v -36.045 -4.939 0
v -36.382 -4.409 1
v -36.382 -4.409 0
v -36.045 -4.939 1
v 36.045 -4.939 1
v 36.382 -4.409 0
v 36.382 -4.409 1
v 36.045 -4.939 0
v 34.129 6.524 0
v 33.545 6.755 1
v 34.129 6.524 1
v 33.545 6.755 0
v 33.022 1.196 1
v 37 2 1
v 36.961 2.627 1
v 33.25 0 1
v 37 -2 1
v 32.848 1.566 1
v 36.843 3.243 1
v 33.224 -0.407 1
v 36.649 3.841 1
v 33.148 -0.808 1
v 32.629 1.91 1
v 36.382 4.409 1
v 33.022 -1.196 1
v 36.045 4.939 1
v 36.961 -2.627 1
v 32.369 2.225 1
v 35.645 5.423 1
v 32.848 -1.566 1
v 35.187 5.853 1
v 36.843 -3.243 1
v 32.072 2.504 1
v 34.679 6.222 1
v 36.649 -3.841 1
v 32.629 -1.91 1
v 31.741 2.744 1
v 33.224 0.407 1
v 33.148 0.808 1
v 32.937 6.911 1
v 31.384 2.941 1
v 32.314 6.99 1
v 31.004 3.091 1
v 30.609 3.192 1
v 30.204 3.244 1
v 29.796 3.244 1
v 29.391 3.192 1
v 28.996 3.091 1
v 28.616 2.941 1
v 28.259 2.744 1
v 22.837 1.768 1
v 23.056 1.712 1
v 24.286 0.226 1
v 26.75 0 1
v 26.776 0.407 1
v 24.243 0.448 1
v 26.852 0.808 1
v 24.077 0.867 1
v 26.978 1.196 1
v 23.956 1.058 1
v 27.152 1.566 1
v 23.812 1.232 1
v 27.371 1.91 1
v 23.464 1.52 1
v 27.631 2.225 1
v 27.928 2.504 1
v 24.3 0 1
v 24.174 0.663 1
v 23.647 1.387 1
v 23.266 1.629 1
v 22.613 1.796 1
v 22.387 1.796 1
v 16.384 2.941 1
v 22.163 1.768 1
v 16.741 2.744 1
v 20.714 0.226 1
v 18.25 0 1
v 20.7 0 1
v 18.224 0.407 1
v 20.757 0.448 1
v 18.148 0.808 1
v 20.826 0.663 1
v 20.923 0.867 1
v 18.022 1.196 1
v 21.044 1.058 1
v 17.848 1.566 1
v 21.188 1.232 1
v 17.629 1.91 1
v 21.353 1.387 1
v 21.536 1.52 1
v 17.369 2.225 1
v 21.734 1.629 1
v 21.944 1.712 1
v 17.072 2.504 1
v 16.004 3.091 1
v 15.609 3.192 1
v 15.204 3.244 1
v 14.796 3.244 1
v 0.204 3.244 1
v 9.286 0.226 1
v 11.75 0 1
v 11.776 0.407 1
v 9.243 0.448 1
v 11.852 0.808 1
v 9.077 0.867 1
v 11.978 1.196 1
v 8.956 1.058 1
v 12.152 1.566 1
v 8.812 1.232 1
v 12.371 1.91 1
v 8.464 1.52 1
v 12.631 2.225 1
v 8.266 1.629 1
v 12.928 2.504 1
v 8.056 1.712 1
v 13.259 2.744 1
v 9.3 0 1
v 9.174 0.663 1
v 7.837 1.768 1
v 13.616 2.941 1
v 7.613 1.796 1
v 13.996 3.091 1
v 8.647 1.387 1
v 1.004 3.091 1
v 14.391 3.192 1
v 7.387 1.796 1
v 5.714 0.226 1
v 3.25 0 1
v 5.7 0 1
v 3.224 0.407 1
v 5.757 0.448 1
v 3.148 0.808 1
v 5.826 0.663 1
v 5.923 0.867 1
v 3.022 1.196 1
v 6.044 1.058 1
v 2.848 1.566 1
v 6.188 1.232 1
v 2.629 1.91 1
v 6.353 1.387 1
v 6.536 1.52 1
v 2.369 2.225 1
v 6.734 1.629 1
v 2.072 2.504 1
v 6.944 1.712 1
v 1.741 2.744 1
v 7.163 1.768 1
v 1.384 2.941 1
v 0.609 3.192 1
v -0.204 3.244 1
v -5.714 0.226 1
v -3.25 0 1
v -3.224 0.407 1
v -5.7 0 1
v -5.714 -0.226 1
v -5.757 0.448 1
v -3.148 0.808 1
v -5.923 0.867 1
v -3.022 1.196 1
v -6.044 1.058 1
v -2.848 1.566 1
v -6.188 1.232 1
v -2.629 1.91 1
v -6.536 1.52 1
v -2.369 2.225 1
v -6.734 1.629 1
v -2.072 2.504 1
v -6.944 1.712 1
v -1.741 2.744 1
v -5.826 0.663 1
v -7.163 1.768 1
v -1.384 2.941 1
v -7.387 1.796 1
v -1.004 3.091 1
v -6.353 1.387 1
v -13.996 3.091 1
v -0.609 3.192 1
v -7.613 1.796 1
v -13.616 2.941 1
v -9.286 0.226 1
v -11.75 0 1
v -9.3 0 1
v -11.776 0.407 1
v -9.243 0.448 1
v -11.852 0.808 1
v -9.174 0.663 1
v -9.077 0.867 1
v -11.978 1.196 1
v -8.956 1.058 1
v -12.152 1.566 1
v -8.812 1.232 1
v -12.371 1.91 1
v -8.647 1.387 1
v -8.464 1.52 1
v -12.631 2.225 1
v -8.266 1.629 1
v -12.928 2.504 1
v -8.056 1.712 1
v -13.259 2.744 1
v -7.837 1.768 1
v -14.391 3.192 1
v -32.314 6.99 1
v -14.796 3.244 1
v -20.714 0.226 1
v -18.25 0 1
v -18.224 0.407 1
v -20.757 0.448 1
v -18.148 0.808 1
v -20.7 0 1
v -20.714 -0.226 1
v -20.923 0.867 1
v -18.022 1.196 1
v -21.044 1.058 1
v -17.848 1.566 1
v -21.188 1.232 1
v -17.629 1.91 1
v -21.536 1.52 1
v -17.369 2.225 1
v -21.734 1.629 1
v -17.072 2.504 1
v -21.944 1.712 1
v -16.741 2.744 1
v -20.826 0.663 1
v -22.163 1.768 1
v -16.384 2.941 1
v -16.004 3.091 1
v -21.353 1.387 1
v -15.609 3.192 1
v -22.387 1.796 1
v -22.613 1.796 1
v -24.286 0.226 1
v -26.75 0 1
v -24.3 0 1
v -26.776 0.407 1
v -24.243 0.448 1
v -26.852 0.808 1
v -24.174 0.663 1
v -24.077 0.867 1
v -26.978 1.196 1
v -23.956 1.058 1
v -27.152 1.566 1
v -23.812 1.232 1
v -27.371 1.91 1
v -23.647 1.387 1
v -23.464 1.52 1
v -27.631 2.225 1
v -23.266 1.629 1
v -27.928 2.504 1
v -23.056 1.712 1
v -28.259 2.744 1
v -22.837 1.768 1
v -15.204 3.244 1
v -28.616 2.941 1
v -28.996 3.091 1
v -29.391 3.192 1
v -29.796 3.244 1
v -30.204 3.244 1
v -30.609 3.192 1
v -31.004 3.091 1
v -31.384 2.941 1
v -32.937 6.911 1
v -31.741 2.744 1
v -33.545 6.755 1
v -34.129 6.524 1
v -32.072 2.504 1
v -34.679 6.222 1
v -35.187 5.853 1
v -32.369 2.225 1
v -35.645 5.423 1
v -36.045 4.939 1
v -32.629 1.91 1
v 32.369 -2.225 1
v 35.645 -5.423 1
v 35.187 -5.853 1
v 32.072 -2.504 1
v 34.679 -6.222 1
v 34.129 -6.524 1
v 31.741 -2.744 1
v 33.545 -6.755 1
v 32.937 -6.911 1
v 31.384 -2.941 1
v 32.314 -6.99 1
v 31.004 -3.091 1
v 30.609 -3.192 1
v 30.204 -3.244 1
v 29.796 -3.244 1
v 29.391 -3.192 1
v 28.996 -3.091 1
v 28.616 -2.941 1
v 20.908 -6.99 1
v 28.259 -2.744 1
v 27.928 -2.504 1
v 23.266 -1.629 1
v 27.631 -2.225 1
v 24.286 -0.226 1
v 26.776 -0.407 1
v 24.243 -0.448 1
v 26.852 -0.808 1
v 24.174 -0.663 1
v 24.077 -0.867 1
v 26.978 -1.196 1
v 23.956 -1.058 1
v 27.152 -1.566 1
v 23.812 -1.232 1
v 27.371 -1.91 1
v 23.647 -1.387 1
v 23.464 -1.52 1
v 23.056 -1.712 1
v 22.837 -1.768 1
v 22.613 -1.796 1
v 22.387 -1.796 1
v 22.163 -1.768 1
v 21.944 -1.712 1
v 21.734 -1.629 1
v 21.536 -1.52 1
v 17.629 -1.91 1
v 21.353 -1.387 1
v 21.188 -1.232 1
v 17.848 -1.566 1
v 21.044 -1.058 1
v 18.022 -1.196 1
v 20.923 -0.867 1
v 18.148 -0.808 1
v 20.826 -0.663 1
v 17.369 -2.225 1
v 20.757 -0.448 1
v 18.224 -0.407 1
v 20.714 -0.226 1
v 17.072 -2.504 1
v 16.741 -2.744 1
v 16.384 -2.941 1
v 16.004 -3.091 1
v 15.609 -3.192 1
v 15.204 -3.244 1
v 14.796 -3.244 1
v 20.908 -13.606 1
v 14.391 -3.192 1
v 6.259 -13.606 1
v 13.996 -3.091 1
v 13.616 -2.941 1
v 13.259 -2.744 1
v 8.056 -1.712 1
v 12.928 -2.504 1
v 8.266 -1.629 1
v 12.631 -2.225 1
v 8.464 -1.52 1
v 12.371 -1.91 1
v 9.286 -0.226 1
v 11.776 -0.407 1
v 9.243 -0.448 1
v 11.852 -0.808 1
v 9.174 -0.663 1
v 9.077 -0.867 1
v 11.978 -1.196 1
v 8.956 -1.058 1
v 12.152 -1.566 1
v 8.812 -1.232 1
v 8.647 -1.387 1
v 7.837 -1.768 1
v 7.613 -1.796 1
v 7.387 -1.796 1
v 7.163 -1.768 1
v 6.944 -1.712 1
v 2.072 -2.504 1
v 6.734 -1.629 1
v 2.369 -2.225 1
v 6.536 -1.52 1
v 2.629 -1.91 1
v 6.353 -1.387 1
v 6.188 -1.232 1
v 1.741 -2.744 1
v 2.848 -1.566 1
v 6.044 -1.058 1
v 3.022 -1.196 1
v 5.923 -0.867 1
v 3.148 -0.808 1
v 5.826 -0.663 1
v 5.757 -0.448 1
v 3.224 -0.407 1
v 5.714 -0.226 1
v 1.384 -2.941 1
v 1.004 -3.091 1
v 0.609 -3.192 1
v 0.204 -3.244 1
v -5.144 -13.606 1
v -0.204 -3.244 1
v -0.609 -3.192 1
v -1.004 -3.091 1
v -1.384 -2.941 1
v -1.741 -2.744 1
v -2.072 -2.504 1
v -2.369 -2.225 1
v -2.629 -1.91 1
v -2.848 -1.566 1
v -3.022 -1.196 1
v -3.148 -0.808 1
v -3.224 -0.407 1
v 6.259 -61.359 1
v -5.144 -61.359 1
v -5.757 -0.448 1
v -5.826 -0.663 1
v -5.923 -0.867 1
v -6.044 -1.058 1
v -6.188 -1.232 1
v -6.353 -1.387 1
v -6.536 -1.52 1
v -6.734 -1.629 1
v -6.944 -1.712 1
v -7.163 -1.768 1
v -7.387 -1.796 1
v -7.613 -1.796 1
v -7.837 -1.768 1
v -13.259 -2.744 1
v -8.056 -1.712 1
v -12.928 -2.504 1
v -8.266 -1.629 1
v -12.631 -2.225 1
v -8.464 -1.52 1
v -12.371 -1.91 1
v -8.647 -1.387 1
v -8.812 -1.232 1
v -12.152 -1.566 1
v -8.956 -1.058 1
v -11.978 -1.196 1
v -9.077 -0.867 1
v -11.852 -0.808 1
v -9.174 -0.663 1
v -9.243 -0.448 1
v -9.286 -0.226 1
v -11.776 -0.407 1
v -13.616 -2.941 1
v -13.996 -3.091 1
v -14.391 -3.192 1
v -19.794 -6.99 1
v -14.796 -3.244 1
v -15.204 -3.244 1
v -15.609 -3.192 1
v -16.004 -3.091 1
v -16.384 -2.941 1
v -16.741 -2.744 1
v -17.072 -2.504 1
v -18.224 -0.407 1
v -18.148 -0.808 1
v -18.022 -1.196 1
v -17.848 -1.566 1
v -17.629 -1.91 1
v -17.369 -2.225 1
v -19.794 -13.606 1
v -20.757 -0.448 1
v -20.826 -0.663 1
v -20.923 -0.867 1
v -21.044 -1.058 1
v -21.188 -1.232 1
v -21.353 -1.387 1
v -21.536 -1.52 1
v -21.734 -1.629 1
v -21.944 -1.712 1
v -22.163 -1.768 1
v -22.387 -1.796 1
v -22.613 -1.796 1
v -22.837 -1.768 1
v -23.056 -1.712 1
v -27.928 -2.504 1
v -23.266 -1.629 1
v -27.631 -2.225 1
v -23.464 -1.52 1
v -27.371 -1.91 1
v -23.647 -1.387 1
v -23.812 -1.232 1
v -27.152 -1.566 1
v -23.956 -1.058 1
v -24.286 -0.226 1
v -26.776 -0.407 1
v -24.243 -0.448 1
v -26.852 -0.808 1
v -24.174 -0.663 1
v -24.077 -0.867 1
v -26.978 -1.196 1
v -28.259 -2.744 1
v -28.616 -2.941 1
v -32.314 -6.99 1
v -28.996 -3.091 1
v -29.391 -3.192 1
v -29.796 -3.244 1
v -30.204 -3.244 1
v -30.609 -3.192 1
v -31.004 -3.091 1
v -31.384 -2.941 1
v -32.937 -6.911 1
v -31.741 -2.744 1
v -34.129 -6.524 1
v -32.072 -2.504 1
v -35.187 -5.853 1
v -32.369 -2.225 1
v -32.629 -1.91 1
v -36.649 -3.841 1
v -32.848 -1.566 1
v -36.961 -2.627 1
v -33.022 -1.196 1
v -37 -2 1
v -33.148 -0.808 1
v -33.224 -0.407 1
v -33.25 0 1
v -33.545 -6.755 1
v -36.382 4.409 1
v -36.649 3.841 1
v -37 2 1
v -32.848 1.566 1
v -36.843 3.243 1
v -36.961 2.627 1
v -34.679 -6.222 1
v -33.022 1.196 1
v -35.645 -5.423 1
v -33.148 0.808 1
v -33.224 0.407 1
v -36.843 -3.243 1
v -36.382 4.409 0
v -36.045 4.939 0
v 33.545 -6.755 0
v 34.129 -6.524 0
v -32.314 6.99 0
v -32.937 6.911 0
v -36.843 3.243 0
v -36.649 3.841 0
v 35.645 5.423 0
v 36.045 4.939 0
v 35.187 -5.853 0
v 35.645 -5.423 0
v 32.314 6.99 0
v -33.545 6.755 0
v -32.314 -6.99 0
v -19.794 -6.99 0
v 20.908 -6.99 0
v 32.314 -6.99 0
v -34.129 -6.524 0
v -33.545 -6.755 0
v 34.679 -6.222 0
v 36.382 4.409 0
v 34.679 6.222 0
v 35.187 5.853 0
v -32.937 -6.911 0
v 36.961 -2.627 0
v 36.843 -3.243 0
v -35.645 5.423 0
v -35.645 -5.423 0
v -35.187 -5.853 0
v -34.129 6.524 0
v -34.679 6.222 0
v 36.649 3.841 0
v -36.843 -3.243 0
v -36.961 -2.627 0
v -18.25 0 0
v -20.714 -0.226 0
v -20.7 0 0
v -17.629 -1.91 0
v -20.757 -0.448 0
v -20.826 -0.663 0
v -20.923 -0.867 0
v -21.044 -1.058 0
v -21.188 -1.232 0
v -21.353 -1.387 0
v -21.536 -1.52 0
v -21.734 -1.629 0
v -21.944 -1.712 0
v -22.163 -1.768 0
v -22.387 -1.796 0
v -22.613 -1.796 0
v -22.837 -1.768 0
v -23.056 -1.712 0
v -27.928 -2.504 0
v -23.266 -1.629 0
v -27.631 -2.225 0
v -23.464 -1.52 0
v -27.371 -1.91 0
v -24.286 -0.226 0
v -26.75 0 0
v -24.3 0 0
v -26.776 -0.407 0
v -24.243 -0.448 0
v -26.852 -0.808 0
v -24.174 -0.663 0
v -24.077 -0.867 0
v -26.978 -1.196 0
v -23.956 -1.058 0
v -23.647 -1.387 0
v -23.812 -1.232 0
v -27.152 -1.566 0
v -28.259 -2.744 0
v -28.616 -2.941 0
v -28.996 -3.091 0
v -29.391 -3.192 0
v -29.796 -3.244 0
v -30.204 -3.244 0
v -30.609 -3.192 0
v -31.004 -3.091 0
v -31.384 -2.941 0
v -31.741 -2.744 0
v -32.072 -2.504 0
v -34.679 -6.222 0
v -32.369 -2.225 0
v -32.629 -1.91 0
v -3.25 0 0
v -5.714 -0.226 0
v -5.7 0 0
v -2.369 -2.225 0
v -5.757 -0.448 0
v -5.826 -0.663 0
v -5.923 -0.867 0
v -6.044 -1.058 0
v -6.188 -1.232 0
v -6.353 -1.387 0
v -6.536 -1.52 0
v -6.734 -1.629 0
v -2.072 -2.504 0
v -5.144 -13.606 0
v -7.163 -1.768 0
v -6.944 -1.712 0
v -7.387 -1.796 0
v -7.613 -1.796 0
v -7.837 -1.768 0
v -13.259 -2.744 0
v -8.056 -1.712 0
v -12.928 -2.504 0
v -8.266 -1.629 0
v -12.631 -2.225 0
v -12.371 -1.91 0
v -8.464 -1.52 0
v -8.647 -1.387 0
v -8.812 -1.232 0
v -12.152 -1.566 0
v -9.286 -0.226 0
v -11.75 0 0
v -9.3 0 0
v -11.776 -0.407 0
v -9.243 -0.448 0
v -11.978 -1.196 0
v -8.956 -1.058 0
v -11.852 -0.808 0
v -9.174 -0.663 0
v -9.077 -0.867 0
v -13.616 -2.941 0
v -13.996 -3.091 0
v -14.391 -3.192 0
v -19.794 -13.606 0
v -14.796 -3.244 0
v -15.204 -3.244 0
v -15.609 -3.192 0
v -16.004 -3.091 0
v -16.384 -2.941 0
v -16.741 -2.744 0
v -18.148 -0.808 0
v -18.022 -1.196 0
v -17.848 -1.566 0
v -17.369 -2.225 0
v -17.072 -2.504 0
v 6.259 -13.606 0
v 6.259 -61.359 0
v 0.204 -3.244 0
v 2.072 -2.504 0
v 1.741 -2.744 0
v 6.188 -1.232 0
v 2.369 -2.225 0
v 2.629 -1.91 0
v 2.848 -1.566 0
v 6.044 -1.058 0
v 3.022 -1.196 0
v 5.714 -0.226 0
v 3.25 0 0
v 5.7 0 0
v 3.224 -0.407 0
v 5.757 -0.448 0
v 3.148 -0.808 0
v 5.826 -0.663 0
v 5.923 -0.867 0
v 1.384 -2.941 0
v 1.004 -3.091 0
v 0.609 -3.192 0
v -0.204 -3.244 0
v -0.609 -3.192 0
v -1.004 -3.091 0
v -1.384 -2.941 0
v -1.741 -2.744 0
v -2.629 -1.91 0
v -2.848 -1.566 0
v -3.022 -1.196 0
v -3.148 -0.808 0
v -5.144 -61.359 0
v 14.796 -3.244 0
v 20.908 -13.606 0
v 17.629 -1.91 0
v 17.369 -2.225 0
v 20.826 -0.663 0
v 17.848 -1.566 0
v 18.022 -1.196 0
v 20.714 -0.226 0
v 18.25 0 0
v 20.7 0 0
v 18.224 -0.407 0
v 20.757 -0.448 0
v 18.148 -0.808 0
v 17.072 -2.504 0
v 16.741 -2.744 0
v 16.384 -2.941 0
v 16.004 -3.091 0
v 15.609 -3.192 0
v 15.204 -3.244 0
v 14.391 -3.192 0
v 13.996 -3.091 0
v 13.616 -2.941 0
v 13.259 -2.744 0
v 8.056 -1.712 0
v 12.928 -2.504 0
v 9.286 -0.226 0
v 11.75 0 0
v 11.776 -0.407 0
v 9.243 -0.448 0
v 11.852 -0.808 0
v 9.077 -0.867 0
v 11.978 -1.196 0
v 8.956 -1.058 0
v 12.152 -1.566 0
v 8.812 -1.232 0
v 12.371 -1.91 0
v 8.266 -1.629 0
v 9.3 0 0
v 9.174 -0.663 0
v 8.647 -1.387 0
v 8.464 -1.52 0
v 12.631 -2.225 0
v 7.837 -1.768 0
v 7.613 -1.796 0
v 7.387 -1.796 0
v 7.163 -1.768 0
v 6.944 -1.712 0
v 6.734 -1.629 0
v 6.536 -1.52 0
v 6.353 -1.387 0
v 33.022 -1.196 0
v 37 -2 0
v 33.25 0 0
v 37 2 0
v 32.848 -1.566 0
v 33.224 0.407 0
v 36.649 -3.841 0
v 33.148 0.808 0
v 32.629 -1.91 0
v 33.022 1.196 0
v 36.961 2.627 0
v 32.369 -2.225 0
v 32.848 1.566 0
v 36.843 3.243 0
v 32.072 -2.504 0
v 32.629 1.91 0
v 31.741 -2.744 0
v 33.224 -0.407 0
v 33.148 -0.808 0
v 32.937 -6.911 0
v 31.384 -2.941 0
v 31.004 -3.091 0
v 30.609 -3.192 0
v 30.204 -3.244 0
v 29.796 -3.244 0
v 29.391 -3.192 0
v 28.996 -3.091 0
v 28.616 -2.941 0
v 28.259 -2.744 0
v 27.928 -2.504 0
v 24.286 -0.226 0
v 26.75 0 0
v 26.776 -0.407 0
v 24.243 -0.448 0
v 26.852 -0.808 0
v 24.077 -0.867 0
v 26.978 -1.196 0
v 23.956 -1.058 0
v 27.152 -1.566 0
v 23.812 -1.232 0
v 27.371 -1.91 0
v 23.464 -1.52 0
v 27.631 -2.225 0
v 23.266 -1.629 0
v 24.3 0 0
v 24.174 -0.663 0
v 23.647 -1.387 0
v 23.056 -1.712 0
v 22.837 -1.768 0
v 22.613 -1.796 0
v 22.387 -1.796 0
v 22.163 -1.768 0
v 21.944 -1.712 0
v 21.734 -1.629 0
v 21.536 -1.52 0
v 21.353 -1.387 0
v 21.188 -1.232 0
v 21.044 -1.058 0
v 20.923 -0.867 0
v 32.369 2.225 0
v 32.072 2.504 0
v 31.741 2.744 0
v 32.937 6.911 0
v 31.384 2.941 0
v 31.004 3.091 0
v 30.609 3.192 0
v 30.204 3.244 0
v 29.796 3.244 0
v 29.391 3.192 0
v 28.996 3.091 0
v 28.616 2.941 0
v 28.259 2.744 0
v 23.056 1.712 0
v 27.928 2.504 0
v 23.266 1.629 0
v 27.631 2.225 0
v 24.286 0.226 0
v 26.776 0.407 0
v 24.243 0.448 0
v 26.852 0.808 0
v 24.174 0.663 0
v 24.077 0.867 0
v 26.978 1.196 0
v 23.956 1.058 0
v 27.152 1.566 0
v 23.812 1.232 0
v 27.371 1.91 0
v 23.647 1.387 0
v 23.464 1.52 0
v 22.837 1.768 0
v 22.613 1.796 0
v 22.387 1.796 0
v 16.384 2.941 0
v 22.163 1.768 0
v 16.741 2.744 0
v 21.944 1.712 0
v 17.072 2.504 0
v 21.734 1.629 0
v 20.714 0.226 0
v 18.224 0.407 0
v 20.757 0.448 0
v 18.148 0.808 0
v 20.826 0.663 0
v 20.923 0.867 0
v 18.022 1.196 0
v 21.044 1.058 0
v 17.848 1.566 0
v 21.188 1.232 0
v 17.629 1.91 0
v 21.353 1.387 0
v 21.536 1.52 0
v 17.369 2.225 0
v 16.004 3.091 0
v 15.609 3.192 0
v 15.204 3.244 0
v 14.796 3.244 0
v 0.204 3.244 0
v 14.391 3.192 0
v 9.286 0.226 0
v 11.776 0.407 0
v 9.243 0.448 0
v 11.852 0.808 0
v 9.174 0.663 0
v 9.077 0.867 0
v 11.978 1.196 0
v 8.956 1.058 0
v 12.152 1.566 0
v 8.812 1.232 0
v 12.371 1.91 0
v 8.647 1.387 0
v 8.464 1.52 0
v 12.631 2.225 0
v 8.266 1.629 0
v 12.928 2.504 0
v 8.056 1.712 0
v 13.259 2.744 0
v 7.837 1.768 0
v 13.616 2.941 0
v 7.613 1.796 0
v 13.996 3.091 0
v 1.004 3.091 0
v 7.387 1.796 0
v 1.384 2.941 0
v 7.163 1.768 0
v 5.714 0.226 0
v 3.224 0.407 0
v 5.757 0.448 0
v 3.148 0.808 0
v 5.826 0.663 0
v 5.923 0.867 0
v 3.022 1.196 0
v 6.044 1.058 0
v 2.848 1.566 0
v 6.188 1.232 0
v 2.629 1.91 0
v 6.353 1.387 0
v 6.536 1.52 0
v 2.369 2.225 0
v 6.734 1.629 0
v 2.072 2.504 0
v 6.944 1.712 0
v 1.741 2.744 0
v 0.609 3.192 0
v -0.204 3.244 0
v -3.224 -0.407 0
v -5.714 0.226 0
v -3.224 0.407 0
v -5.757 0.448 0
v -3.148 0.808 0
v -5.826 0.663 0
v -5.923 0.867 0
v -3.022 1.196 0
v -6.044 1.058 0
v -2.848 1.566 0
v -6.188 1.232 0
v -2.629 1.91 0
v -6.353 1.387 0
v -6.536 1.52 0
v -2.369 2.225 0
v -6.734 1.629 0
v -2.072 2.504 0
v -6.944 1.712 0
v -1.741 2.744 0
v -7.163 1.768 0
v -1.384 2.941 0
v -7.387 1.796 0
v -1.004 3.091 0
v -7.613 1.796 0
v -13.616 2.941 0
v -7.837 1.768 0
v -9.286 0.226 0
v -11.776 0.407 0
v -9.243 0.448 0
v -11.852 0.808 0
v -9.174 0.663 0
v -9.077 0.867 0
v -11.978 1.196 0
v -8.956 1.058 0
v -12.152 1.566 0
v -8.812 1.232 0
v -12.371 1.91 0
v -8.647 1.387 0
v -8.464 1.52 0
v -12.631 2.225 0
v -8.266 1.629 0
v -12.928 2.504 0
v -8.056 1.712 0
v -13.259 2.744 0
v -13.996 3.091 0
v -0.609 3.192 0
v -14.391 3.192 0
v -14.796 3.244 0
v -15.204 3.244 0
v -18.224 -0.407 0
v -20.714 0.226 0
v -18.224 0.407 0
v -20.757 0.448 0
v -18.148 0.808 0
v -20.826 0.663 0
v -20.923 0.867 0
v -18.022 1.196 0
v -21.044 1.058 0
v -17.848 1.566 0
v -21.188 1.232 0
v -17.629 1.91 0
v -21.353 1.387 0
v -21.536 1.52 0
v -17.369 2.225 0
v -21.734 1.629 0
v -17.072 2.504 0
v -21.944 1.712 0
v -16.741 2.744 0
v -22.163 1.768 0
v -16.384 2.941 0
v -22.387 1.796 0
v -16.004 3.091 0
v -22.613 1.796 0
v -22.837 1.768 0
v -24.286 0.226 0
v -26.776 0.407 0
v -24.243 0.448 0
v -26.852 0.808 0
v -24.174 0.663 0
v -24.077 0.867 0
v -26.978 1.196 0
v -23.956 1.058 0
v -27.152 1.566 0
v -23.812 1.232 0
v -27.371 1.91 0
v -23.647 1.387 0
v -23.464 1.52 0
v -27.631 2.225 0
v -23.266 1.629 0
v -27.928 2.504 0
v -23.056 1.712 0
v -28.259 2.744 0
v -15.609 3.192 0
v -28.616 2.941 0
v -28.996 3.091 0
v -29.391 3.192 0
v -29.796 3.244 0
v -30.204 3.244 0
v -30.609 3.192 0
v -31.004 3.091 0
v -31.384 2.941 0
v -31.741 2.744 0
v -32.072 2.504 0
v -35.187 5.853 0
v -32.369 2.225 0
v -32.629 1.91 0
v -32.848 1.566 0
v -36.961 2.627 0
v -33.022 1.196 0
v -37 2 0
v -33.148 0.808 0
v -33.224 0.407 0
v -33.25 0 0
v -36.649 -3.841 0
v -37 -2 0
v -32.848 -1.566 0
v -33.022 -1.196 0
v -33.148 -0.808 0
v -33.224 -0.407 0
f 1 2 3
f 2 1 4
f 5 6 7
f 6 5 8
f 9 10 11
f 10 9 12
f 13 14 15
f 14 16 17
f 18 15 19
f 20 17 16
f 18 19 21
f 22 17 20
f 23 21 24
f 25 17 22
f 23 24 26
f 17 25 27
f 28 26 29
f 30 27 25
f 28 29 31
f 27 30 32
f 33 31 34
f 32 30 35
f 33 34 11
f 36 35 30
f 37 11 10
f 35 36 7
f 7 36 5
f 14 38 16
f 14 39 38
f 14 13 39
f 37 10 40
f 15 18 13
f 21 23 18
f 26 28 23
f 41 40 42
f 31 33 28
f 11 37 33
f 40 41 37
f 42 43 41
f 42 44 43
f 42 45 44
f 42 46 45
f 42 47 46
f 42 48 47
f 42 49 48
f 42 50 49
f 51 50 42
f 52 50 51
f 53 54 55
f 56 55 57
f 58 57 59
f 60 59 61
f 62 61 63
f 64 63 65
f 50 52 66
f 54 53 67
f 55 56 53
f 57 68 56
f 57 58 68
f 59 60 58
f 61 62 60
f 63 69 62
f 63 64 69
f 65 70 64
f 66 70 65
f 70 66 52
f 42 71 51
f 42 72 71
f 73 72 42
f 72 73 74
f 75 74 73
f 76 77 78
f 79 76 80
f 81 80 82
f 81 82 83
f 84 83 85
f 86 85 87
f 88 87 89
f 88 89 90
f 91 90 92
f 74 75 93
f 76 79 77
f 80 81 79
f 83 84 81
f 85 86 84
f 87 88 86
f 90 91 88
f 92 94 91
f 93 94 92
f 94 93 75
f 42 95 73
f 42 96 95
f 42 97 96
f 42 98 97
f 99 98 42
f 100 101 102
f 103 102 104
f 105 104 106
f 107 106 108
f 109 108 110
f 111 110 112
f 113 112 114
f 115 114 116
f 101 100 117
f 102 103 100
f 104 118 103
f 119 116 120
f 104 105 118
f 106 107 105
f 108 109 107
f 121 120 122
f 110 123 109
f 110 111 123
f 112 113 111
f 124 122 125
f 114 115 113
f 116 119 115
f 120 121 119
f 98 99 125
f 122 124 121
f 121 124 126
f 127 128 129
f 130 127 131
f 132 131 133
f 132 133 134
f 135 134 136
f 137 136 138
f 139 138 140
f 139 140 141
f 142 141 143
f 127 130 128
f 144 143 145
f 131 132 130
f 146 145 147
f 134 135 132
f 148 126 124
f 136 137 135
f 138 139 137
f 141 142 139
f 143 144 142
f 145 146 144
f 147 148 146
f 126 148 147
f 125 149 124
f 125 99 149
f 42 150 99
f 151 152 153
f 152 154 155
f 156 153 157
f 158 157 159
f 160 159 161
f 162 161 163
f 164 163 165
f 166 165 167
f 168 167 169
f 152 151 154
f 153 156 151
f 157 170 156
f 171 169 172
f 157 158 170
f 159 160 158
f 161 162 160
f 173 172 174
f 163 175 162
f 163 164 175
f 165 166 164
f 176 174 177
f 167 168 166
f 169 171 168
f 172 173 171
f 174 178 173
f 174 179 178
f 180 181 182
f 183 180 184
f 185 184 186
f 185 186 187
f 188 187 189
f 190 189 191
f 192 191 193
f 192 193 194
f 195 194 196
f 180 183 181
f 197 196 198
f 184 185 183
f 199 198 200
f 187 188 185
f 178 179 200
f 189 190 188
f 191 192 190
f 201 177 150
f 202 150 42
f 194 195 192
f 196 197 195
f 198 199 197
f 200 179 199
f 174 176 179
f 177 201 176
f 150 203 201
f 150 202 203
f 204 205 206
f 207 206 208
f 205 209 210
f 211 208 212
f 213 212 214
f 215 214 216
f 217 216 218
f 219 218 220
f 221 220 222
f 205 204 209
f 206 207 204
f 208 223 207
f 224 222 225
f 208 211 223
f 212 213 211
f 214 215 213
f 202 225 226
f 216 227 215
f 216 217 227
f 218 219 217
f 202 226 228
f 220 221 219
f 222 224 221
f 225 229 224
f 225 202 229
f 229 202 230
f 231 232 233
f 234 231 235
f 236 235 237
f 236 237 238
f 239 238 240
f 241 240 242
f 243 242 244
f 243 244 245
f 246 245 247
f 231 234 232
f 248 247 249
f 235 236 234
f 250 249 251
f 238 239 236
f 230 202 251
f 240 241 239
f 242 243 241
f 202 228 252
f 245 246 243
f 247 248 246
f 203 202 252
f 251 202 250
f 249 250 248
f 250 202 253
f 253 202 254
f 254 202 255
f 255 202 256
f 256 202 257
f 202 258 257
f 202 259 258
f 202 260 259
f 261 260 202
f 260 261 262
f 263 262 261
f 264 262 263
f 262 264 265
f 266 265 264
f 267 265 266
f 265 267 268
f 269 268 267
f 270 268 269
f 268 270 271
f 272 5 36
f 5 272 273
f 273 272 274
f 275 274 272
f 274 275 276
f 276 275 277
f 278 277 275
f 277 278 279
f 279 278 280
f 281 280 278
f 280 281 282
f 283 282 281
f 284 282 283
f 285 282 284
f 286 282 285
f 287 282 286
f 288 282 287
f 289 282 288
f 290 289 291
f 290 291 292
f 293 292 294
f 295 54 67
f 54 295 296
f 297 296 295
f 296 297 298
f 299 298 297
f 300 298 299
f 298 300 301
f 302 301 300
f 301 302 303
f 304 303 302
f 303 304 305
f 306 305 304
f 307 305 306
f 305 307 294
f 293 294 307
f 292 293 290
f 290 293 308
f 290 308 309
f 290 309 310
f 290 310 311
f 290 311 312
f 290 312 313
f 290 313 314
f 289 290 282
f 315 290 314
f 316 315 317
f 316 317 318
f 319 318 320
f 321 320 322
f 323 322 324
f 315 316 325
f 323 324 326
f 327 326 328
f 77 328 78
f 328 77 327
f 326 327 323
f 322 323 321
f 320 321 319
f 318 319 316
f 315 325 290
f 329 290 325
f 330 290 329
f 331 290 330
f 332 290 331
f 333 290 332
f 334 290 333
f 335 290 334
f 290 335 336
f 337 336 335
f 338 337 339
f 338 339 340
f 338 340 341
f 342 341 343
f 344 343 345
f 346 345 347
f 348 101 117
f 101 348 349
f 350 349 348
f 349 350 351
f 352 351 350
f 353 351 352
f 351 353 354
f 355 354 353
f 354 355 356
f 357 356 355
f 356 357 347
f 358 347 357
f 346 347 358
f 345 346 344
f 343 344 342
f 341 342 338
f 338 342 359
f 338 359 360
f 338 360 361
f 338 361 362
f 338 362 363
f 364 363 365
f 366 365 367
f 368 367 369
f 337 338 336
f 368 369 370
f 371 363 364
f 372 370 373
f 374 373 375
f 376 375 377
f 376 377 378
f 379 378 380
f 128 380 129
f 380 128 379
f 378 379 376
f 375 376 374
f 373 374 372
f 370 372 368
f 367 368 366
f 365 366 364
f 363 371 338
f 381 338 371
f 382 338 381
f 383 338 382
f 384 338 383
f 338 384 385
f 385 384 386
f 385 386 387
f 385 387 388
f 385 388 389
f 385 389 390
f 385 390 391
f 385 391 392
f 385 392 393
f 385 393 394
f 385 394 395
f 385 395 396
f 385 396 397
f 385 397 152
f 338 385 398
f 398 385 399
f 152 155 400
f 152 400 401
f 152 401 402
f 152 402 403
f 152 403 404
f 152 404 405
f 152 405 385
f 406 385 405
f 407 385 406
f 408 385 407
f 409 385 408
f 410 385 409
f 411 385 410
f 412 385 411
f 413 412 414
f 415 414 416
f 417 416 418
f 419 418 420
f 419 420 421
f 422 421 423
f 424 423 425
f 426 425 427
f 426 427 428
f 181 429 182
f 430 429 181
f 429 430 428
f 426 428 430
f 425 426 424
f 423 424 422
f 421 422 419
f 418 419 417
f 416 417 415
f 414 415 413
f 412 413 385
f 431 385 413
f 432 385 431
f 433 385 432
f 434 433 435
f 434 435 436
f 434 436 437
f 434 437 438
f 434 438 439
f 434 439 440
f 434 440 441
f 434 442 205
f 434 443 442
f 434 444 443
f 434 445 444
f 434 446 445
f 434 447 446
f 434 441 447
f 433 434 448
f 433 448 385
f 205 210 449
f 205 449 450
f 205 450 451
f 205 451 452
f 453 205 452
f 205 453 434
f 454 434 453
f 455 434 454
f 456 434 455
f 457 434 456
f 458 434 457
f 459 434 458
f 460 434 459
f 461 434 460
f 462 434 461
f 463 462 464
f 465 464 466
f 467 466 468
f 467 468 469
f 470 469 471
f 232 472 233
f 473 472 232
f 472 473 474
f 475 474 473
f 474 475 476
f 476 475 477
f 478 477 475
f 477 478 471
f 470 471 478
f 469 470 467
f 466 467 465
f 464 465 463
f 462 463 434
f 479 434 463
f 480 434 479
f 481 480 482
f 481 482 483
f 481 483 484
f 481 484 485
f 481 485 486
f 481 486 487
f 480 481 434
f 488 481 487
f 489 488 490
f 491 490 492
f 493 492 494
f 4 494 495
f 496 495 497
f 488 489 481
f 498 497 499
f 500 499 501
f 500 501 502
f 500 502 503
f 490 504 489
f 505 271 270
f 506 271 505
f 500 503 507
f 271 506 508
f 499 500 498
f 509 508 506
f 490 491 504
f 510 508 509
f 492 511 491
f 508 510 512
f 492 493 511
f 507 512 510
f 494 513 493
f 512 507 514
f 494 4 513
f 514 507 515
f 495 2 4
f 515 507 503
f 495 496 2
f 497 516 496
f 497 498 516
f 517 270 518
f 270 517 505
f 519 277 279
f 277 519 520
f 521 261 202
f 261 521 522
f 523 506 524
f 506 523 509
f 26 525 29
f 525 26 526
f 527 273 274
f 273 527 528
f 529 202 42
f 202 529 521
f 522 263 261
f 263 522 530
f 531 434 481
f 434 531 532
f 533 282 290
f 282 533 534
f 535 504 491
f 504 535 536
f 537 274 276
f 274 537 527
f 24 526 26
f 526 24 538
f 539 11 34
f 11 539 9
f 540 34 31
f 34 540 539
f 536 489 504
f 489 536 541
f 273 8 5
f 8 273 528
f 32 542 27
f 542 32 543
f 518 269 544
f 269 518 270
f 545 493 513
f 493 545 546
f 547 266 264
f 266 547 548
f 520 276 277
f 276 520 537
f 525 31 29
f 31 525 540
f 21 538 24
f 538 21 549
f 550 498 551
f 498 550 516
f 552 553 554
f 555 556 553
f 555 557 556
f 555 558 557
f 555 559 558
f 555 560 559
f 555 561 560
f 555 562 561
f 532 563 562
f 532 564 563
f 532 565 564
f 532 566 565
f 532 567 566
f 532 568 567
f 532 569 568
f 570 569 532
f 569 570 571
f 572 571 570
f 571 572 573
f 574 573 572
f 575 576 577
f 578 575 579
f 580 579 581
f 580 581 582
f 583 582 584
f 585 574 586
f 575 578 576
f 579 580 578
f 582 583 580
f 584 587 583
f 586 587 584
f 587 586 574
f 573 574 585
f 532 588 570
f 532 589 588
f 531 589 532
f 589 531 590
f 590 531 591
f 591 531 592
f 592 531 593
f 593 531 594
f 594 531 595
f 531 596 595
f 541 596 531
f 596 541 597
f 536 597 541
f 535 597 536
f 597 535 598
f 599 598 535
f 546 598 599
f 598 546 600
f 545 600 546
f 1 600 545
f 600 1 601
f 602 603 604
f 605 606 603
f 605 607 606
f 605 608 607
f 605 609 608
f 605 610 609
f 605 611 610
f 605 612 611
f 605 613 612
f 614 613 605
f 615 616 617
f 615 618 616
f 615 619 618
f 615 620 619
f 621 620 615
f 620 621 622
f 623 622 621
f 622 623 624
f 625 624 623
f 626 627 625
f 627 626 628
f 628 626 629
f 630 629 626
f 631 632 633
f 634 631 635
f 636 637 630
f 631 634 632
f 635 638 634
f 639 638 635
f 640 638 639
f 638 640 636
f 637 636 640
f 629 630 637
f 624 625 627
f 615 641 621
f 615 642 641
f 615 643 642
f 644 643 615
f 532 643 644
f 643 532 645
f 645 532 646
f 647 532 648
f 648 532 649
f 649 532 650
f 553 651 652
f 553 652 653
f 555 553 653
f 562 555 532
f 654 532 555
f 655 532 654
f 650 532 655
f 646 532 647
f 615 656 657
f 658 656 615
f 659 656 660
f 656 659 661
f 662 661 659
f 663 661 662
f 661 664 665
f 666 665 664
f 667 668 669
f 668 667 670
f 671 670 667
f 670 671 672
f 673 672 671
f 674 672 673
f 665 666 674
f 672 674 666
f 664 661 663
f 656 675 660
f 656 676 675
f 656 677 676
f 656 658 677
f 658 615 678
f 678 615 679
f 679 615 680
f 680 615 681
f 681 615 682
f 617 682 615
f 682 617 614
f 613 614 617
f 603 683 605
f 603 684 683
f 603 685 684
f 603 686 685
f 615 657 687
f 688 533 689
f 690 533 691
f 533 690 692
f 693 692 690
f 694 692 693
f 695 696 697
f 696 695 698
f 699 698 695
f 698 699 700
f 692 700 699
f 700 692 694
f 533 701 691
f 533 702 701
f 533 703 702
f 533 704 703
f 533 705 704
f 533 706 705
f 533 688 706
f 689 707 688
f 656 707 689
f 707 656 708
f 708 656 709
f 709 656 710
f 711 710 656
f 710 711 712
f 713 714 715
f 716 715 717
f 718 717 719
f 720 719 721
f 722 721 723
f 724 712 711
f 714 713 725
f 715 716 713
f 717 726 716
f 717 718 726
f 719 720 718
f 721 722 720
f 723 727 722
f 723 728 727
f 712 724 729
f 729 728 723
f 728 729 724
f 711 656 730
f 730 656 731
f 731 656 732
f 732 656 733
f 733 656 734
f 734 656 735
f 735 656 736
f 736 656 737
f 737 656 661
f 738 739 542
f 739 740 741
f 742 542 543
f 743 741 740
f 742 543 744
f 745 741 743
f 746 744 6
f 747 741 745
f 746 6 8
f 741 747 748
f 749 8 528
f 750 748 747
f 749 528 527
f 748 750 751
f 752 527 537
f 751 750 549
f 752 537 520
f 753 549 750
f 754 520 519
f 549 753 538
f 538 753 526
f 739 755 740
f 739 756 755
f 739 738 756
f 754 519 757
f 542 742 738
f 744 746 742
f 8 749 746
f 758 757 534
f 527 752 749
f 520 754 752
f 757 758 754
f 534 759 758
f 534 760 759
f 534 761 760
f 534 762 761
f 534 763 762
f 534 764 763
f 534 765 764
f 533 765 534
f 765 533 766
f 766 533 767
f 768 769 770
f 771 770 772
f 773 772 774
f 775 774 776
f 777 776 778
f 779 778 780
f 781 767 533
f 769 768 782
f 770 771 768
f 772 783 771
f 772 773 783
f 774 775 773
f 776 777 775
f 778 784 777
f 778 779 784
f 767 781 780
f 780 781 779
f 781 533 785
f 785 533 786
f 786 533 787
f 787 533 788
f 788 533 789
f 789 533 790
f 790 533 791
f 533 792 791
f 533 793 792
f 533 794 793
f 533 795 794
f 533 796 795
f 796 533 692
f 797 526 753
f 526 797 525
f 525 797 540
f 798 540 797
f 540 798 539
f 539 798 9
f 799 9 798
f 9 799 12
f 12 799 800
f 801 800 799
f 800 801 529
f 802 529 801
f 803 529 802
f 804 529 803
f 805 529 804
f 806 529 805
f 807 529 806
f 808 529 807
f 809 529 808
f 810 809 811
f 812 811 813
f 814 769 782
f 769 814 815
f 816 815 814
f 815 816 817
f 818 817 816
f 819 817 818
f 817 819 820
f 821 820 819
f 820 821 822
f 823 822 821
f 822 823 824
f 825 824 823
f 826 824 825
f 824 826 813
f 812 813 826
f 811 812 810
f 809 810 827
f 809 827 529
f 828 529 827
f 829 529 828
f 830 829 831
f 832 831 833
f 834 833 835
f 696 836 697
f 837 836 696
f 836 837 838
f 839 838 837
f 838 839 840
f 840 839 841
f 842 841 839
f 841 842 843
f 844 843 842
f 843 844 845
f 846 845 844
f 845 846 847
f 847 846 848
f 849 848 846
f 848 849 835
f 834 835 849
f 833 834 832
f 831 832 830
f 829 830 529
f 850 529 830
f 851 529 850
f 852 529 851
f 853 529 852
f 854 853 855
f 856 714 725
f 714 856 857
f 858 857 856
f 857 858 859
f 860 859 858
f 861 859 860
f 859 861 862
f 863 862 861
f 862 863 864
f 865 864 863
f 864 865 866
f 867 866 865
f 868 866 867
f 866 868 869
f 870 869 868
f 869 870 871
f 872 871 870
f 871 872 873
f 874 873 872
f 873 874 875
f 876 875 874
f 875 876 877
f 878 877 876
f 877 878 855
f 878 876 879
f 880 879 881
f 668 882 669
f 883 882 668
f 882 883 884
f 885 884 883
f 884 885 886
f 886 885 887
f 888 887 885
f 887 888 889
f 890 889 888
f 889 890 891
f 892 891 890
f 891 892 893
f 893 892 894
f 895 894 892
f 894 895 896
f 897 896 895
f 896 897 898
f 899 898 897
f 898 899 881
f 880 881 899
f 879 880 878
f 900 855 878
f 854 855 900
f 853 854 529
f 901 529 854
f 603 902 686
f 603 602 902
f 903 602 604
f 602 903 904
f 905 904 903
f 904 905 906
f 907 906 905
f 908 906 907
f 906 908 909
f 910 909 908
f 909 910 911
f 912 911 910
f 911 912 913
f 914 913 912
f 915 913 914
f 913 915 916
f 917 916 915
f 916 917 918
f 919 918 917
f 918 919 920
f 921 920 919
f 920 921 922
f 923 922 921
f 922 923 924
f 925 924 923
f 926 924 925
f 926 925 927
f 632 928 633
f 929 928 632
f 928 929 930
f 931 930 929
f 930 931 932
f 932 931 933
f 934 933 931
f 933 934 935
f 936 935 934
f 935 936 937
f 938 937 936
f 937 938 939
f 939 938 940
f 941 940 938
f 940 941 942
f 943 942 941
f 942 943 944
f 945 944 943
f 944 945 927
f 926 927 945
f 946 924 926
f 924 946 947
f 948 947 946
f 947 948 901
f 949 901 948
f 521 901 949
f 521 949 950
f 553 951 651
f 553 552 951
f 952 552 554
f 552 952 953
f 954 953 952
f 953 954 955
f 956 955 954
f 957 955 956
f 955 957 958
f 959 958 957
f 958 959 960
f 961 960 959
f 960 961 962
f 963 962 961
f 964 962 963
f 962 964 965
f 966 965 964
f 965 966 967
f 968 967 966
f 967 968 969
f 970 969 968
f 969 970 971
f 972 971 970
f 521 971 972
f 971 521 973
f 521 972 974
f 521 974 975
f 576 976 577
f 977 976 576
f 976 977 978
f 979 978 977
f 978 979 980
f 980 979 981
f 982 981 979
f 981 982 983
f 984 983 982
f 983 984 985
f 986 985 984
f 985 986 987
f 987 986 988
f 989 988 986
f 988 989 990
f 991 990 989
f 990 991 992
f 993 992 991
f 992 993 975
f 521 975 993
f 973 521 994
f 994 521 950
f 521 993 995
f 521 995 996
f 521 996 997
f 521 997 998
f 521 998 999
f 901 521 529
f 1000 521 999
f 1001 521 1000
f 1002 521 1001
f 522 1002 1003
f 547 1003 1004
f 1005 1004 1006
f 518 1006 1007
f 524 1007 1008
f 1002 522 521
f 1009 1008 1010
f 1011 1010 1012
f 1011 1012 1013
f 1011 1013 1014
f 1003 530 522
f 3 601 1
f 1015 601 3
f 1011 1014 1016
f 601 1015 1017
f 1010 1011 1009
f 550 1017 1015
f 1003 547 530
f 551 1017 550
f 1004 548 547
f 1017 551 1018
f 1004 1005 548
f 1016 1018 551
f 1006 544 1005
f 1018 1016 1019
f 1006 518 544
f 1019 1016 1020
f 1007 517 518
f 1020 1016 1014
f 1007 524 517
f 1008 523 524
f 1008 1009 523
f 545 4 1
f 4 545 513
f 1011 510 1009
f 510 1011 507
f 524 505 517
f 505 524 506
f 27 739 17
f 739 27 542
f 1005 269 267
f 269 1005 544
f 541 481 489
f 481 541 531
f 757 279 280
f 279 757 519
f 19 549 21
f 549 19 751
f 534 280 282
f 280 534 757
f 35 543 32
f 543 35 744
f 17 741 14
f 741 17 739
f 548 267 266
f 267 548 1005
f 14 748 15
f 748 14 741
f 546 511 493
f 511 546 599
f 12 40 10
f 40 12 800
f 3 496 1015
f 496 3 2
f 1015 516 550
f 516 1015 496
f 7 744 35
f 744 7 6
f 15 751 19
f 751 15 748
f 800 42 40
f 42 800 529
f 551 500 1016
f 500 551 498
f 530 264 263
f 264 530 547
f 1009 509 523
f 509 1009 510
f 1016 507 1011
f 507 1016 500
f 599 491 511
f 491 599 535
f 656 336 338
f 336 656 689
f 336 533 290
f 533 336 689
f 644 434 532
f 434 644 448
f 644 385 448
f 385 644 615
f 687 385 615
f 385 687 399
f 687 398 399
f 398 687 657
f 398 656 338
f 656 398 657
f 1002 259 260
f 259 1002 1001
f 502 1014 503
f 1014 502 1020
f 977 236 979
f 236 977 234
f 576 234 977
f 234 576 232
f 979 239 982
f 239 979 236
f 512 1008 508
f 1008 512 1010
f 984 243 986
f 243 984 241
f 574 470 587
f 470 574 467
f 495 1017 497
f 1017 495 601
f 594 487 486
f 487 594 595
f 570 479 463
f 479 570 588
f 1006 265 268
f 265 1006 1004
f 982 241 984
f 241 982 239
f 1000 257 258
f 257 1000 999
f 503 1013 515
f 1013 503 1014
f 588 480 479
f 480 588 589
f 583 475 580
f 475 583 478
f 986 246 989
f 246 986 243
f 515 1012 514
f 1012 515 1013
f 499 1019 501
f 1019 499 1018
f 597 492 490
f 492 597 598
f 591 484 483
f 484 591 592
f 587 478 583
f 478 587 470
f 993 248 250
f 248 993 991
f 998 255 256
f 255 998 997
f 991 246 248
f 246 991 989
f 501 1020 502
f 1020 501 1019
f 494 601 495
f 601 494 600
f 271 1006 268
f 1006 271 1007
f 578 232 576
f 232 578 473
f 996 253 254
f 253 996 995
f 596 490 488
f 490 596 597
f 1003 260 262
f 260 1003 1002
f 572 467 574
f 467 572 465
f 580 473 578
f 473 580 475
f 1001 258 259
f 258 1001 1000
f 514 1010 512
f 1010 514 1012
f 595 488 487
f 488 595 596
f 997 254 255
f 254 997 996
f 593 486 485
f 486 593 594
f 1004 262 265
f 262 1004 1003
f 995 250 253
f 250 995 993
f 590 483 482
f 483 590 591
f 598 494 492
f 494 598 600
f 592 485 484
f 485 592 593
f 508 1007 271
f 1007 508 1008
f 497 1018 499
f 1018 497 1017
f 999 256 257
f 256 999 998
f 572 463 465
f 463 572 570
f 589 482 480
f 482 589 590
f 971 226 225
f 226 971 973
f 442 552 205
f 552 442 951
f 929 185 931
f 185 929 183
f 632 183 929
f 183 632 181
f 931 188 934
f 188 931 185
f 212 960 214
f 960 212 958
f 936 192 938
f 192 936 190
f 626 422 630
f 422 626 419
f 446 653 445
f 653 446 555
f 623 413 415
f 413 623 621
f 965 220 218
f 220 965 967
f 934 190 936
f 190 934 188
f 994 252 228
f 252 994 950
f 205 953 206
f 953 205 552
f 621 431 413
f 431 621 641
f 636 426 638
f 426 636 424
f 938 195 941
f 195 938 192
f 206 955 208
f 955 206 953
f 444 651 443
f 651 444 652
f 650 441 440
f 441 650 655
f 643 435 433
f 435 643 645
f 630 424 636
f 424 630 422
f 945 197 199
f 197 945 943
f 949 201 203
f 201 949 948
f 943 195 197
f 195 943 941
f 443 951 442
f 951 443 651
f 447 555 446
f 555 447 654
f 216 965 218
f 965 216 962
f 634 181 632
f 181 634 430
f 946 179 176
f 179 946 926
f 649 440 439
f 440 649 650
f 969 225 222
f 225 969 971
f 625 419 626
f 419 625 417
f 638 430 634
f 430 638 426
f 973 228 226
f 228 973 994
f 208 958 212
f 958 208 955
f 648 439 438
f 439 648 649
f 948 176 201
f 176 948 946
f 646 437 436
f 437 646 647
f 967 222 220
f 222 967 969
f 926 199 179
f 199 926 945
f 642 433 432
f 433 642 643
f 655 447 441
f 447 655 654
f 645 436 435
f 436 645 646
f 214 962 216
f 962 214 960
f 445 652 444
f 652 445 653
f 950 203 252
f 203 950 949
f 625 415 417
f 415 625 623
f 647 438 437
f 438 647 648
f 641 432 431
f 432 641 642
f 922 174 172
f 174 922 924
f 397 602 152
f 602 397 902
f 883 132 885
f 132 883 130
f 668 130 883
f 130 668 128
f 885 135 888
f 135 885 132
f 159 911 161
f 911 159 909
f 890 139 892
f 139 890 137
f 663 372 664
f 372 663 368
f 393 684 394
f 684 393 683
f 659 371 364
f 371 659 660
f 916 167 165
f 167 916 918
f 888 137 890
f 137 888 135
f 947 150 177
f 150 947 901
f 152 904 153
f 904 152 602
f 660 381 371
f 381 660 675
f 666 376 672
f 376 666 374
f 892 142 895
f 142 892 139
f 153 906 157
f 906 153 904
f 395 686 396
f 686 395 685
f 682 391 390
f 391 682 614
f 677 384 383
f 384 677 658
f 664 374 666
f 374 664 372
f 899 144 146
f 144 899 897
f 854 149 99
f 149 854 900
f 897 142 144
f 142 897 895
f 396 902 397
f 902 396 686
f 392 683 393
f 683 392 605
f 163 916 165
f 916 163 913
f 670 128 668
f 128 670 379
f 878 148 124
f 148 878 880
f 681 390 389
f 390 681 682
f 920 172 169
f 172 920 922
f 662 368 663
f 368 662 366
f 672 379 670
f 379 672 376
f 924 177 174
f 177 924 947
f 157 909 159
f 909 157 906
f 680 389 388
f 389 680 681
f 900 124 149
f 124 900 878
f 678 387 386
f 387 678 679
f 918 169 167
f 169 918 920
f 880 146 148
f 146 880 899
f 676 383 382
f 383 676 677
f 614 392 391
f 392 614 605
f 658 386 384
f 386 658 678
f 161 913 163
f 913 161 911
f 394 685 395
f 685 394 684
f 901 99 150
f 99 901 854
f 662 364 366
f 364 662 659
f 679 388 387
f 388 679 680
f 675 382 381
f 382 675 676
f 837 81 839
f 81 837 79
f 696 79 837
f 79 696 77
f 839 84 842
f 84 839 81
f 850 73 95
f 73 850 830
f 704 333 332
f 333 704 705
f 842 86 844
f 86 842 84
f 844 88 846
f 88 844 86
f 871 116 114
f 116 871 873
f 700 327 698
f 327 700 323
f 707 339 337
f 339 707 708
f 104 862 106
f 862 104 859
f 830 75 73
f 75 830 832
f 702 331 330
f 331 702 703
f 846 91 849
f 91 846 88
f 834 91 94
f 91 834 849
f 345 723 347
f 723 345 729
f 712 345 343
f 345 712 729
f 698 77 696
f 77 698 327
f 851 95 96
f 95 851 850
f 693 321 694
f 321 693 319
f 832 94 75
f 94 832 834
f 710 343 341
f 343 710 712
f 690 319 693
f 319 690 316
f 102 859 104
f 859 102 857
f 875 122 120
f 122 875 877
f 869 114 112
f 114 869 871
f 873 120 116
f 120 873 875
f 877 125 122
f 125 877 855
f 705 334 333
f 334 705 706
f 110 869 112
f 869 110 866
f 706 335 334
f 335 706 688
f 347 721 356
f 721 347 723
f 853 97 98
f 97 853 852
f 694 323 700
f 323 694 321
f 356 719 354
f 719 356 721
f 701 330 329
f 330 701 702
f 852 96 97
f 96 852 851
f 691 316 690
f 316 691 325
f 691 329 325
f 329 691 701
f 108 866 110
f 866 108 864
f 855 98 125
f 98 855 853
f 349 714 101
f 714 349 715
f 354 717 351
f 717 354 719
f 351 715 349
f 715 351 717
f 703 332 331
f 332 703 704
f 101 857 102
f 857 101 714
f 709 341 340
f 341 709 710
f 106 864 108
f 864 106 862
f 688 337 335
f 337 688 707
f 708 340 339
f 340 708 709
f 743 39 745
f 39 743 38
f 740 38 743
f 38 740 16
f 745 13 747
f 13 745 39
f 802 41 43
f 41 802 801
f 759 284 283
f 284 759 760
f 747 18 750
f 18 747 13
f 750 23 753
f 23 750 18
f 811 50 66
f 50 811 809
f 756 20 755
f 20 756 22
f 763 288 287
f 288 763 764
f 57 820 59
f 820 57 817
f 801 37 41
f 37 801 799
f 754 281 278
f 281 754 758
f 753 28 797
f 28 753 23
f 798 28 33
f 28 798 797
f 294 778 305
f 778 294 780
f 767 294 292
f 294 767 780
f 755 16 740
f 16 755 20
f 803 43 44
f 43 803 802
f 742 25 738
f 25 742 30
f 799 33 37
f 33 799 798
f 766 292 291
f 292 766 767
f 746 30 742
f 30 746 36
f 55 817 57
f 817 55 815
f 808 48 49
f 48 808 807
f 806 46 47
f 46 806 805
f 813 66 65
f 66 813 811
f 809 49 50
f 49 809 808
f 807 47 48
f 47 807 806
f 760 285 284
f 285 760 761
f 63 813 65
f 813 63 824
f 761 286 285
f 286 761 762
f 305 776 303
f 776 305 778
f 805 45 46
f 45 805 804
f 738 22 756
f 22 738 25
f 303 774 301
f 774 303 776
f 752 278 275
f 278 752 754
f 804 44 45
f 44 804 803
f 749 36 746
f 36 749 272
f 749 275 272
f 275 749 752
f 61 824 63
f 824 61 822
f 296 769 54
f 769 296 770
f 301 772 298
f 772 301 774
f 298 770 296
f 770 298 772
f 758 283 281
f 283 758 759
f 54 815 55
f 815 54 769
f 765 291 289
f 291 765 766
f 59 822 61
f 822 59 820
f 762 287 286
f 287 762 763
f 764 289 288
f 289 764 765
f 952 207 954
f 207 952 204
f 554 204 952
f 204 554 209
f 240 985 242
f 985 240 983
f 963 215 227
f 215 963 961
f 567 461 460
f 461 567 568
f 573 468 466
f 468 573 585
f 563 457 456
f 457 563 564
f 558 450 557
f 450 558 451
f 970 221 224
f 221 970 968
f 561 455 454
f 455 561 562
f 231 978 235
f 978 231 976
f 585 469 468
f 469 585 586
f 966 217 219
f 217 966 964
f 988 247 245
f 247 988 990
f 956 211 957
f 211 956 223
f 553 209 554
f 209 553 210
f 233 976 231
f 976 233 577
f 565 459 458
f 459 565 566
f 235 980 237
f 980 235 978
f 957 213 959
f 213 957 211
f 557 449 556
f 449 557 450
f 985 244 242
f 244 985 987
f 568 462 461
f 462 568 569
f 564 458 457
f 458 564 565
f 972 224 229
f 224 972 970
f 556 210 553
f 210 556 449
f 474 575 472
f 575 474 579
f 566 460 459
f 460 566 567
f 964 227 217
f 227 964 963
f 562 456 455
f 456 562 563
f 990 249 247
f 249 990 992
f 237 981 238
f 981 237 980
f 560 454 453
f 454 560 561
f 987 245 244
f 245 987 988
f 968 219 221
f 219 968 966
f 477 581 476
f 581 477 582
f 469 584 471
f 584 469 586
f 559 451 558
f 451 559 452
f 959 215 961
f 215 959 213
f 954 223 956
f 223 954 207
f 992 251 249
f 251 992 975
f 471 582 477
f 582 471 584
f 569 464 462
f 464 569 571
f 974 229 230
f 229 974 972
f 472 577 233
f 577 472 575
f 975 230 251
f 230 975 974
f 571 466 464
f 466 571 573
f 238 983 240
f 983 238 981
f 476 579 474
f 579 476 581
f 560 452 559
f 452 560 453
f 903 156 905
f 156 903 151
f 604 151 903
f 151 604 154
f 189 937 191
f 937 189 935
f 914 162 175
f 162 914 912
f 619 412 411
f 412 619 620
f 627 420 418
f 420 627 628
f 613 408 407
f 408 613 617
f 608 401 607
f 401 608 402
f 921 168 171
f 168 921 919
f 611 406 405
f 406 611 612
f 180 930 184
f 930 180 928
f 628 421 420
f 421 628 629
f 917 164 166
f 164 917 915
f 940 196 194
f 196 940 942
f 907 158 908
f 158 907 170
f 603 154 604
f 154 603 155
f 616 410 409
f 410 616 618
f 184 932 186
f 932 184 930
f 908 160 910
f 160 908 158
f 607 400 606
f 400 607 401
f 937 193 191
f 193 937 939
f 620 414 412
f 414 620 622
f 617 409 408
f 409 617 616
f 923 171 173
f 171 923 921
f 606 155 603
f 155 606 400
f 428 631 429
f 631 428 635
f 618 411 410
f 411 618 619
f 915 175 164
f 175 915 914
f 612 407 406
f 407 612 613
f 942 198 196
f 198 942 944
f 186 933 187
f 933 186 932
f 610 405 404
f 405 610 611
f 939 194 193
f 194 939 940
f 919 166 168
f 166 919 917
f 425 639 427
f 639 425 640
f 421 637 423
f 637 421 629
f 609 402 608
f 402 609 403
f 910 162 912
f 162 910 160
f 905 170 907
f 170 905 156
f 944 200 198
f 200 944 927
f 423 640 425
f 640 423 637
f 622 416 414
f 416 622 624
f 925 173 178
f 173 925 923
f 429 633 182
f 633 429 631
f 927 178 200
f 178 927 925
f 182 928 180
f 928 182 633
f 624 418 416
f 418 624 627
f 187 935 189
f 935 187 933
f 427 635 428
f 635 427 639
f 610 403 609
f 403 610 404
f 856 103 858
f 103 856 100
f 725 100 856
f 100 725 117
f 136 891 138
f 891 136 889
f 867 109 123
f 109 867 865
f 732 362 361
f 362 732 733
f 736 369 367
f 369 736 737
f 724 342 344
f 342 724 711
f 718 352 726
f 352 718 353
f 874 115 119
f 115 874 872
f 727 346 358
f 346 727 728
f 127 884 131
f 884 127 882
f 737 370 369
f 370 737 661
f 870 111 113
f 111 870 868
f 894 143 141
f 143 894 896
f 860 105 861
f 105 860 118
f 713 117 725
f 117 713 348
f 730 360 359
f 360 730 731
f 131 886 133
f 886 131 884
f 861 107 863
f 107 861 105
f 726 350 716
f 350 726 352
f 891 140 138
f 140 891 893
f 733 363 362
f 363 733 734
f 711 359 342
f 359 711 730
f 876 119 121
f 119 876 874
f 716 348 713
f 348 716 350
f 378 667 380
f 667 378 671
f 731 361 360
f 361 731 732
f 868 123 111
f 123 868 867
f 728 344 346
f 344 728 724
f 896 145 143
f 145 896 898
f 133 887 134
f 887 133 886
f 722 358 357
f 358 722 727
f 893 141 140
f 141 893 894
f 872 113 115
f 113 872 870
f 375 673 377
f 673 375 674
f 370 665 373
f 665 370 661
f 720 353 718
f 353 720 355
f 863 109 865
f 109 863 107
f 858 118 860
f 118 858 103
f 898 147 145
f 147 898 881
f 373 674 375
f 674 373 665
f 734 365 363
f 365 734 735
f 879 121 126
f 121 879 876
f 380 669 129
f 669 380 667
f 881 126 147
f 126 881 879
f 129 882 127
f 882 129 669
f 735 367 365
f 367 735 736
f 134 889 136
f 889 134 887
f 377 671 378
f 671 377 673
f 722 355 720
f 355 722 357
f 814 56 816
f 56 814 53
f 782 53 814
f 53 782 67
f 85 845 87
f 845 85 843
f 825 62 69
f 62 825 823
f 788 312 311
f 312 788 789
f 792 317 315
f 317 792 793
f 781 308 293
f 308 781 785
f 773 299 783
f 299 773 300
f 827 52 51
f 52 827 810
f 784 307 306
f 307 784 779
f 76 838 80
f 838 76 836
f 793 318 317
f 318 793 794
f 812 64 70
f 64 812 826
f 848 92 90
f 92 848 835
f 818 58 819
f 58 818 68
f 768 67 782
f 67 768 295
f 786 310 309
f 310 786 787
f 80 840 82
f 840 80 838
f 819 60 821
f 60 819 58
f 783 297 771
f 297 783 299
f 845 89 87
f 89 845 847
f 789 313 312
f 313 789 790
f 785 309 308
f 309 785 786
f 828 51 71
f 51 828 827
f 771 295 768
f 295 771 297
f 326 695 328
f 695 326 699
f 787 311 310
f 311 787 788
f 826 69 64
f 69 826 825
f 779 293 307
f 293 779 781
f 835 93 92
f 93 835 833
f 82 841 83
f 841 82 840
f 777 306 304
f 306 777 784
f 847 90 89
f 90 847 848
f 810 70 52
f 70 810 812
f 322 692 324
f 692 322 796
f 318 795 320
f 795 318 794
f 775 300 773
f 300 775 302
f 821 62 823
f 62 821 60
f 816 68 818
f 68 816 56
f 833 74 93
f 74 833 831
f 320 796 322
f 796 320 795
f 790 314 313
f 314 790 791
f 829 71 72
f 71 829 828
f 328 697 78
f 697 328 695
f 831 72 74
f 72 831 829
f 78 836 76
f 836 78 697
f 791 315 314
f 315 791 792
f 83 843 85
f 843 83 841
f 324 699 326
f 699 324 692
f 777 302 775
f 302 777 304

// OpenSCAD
$fn = 50;


difference() {
	union() {
		hull() {
			translate(v = [-32.0000000000, 2.0000000000, 0]) {
				cylinder(h = 1, r = 5);
			}
			translate(v = [32.0000000000, 2.0000000000, 0]) {
				cylinder(h = 1, r = 5);
			}
			translate(v = [-32.0000000000, -2.0000000000, 0]) {
				cylinder(h = 1, r = 5);
			}
			translate(v = [32.0000000000, -2.0000000000, 0]) {
				cylinder(h = 1, r = 5);
			}
		}
		translate(v = [0, -5, 0]) {
			linear_extrude(height = 1) {
				text(font = "DejaVu Sans Mono:style=Bold", halign = "center", size = 57.0000000000, text = "T", valign = "top");
			}
		}
	}
	union() {
		translate(v = [-30.0000000000, 0.0000000000, 0]) {
			translate(v = [0, 0, -100]) {
				cylinder(h = 200, r = 3.2500000000);
			}
		}
		translate(v = [-15.0000000000, 0.0000000000, 0]) {
			translate(v = [0, 0, -100]) {
				cylinder(h = 200, r = 3.2500000000);
			}
		}
		translate(v = [0, 0, -100]) {
			cylinder(h = 200, r = 3.2500000000);
		}
		translate(v = [15.0000000000, 0.0000000000, 0]) {
			translate(v = [0, 0, -100]) {
				cylinder(h = 200, r = 3.2500000000);
			}
		}
		translate(v = [30.0000000000, 0.0000000000, 0]) {
			translate(v = [0, 0, -100]) {
				cylinder(h = 200, r = 3.2500000000);
			}
		}
		translate(v = [-30.0000000000, 0.0000000000, 0]) {
			translate(v = [0, 0, -100]) {
				cylinder(h = 200, r = 1.8000000000);
			}
		}
		translate(v = [-22.5000000000, 0.0000000000, 0]) {
			translate(v = [0, 0, -100]) {
				cylinder(h = 200, r = 1.8000000000);
			}
		}
		translate(v = [-15.0000000000, 0.0000000000, 0]) {
			translate(v = [0, 0, -100]) {
				cylinder(h = 200, r = 1.8000000000);
			}
		}
		translate(v = [-7.5000000000, 0.0000000000, 0]) {
			translate(v = [0, 0, -100]) {
				cylinder(h = 200, r = 1.8000000000);
			}
		}
		translate(v = [0, 0, -100]) {
			cylinder(h = 200, r = 1.8000000000);
		}
		translate(v = [7.5000000000, 0.0000000000, 0]) {
			translate(v = [0, 0, -100]) {
				cylinder(h = 200, r = 1.8000000000);
			}
		}
		translate(v = [15.0000000000, 0.0000000000, 0]) {
			translate(v = [0, 0, -100]) {
				cylinder(h = 200, r = 1.8000000000);
			}
		}
		translate(v = [22.5000000000, 0.0000000000, 0]) {
			translate(v = [0, 0, -100]) {
				cylinder(h = 200, r = 1.8000000000);
			}
		}
		translate(v = [30.0000000000, 0.0000000000, 0]) {
			translate(v = [0, 0, -100]) {
				cylinder(h = 200, r = 1.8000000000);
			}
		}
	}
}
